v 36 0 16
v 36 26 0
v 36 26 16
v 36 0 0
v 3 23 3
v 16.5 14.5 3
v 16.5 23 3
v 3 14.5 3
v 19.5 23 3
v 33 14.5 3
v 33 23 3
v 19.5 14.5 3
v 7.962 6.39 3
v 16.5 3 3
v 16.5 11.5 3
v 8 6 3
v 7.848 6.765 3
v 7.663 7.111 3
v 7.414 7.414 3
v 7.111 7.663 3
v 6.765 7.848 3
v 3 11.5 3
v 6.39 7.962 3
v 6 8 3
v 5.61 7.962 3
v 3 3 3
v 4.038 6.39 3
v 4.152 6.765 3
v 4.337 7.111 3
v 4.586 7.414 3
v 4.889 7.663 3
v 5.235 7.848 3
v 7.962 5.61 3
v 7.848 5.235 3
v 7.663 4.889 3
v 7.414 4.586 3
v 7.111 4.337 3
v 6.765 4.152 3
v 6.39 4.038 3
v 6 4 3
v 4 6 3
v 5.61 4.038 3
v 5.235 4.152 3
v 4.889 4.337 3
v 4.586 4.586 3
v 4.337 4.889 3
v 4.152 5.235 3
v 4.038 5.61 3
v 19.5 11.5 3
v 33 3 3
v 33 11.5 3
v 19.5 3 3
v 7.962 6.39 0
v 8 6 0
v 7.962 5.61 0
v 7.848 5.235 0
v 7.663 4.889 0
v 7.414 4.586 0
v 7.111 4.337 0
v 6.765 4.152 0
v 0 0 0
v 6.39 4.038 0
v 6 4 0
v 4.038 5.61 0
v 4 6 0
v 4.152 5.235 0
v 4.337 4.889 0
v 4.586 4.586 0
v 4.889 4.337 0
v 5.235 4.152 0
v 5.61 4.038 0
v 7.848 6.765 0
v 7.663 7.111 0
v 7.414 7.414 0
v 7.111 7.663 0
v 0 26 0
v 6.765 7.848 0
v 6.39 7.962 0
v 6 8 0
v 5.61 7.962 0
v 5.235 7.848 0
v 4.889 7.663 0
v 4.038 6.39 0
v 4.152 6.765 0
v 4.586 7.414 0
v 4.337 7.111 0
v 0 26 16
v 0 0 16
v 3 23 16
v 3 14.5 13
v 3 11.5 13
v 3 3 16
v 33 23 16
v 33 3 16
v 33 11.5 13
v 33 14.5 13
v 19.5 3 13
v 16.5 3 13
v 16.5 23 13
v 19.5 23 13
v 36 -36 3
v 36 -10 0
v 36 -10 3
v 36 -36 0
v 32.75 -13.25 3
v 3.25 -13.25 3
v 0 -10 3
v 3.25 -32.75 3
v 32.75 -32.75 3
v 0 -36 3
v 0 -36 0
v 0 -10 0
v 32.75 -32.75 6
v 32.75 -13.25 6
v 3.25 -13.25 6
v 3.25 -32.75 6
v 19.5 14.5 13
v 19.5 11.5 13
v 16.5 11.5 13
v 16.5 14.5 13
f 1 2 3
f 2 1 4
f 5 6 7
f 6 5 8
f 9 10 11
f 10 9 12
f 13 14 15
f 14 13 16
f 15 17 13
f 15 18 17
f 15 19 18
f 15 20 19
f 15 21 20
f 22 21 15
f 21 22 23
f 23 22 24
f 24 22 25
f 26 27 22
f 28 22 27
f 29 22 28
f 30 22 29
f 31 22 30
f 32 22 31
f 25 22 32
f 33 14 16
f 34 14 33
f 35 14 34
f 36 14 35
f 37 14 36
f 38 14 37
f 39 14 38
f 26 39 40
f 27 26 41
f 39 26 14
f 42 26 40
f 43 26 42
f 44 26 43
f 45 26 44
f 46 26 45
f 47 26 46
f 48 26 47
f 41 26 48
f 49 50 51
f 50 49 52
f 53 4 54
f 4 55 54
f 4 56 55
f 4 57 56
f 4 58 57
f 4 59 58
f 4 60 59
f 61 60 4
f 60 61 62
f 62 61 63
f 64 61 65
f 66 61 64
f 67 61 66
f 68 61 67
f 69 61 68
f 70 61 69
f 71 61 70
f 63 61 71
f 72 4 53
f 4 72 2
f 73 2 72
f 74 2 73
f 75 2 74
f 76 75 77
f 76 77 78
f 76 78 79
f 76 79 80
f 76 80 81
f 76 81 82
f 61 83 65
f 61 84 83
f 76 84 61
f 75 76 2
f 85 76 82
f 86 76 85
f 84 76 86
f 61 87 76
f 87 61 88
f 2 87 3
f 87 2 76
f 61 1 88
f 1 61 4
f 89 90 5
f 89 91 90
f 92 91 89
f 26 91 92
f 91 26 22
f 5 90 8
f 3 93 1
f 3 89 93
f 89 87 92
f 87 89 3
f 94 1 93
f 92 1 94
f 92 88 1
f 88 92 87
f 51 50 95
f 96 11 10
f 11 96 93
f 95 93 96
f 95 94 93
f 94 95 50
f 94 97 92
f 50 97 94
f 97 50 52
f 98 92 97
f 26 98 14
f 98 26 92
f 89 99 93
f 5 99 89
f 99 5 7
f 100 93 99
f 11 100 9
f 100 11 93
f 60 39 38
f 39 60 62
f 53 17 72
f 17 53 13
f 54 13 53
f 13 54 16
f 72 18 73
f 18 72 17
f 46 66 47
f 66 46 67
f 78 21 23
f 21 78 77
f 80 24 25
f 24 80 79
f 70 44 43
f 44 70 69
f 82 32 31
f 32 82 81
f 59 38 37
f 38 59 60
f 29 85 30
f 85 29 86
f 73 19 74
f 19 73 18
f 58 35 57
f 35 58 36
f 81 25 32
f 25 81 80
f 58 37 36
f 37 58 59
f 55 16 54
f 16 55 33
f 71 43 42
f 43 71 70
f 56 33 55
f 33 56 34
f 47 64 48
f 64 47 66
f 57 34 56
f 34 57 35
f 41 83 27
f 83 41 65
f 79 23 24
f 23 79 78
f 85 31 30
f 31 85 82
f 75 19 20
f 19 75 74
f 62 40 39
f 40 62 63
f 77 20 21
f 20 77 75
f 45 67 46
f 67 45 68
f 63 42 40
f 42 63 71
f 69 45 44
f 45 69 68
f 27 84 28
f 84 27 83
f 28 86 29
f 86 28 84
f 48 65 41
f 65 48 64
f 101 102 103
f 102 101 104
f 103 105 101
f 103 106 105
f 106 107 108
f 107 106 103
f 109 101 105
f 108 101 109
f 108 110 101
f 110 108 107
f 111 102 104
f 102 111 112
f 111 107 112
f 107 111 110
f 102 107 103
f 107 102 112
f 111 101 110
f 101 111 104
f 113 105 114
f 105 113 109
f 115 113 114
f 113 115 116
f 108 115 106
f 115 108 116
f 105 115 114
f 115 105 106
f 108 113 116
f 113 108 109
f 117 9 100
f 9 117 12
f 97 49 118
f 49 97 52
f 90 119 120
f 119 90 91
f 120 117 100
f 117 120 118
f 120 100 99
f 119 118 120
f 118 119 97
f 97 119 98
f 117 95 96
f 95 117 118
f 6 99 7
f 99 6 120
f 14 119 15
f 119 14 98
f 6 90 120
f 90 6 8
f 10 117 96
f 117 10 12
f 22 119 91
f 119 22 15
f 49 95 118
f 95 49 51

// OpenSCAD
// Options
boxInnerWidth = 30;
boxInnerDepth = 20;
boxInnerHeight = 10;
boxWallThickness = 3;
boxFloorThickness = 3;
includeLid = true;
boxLidThickness = 3;
boxLidPlugThickness = 3;
boxTolerance = 0.25;
boxPieceMargin = 10;
holeOffset = 6;
holeRadius = 2;
xDividers = 2;
yDividers = 2;

// Calculations
boxWidth = boxInnerWidth + (boxWallThickness * 2);
boxDepth = boxInnerDepth + (boxWallThickness * 2);
boxInnerWidthMinusTolerance = boxInnerWidth - (boxTolerance * 2);
boxInnerDepthMinusTolerance = boxInnerDepth - (boxTolerance * 2);

// Box
difference()
{    
    union()
    {
        cube([boxWidth, boxDepth, boxFloorThickness], center=false);
        translate([0, 0, boxFloorThickness])
        {        
            cube([boxWallThickness, boxDepth, boxInnerHeight + boxLidPlugThickness], center=false);
        }
        translate([boxInnerWidth + boxWallThickness, 0, boxFloorThickness])
        {        
            cube([boxWallThickness, boxDepth, boxInnerHeight + boxLidPlugThickness], center=false);
        }
        translate([boxWallThickness, 0, boxFloorThickness])
        {        
            cube([boxInnerWidth, boxWallThickness, boxInnerHeight + boxLidPlugThickness], center=false);
        }
        translate([boxWallThickness, boxInnerDepth + boxWallThickness, boxFloorThickness])
        {        
            cube([boxInnerWidth, boxWallThickness, boxInnerHeight + boxLidPlugThickness], center=false);
        }
        translate([boxWallThickness, boxInnerDepth + boxWallThickness, boxFloorThickness])
        {        
            cube([boxInnerWidth, boxWallThickness, boxInnerHeight + boxLidPlugThickness], center=false);
        }
    }    
    translate([holeOffset, holeOffset, -boxFloorThickness])
    {
        cylinder(boxFloorThickness * 3, holeRadius, holeRadius, center=false, $fn = 32);
    }
}

// Lid
if (includeLid)
{    
    union()
    {
        translate([0, 0 - boxDepth - boxPieceMargin, 0])
        {        
            cube([boxWidth, boxDepth, boxLidThickness], center=false);
        }
        translate([boxWallThickness + boxTolerance, 0 - boxDepth - boxPieceMargin + boxWallThickness + boxTolerance, boxLidThickness])
        {        
            cube([boxInnerWidthMinusTolerance, boxInnerDepthMinusTolerance, boxLidPlugThickness], center=false);
        }
    }
}

// Dividers (X)
if (xDividers > 1)
{
    xStep = boxInnerWidth / xDividers;
    for (x =[1:xDividers - 1])
    {        
        translate([x * xStep + (boxWallThickness / 2), 0, boxFloorThickness])
        {        
            cube([boxWallThickness, boxDepth, boxInnerHeight], center=false);
        }
    }
}

// Dividers (Y)
if (yDividers > 1)
{
    yStep = boxInnerDepth / yDividers;
    for (y =[1:yDividers - 1])
    {        
        translate([0, y * yStep + (boxWallThickness / 2), boxFloorThickness])
        {        
            cube([boxWidth, boxWallThickness, boxInnerHeight], center=false);
        }
    }
}
